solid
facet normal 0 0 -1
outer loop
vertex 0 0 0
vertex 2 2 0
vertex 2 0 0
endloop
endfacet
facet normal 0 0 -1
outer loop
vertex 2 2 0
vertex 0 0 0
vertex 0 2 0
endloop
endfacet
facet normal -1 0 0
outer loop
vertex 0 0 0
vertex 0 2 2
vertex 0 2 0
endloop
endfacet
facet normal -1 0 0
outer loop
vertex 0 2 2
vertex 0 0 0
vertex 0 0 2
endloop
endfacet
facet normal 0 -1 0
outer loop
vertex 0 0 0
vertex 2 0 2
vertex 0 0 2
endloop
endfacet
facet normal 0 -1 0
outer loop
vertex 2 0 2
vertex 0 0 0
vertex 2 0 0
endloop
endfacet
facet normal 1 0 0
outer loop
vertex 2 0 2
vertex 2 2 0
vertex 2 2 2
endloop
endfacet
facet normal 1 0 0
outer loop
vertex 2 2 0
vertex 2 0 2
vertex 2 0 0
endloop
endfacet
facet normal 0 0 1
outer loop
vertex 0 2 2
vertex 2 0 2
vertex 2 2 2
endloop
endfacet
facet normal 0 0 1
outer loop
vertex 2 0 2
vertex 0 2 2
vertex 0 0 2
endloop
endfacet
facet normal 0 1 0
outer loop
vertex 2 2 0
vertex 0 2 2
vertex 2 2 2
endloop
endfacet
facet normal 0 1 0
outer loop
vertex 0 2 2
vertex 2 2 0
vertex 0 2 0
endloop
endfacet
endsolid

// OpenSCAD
module foo() {
    for (i=[0:$children-1]) {
	children(i);
    }
}

foo() {
    cube(1);
    echo("hello");
    cube(2);
}
